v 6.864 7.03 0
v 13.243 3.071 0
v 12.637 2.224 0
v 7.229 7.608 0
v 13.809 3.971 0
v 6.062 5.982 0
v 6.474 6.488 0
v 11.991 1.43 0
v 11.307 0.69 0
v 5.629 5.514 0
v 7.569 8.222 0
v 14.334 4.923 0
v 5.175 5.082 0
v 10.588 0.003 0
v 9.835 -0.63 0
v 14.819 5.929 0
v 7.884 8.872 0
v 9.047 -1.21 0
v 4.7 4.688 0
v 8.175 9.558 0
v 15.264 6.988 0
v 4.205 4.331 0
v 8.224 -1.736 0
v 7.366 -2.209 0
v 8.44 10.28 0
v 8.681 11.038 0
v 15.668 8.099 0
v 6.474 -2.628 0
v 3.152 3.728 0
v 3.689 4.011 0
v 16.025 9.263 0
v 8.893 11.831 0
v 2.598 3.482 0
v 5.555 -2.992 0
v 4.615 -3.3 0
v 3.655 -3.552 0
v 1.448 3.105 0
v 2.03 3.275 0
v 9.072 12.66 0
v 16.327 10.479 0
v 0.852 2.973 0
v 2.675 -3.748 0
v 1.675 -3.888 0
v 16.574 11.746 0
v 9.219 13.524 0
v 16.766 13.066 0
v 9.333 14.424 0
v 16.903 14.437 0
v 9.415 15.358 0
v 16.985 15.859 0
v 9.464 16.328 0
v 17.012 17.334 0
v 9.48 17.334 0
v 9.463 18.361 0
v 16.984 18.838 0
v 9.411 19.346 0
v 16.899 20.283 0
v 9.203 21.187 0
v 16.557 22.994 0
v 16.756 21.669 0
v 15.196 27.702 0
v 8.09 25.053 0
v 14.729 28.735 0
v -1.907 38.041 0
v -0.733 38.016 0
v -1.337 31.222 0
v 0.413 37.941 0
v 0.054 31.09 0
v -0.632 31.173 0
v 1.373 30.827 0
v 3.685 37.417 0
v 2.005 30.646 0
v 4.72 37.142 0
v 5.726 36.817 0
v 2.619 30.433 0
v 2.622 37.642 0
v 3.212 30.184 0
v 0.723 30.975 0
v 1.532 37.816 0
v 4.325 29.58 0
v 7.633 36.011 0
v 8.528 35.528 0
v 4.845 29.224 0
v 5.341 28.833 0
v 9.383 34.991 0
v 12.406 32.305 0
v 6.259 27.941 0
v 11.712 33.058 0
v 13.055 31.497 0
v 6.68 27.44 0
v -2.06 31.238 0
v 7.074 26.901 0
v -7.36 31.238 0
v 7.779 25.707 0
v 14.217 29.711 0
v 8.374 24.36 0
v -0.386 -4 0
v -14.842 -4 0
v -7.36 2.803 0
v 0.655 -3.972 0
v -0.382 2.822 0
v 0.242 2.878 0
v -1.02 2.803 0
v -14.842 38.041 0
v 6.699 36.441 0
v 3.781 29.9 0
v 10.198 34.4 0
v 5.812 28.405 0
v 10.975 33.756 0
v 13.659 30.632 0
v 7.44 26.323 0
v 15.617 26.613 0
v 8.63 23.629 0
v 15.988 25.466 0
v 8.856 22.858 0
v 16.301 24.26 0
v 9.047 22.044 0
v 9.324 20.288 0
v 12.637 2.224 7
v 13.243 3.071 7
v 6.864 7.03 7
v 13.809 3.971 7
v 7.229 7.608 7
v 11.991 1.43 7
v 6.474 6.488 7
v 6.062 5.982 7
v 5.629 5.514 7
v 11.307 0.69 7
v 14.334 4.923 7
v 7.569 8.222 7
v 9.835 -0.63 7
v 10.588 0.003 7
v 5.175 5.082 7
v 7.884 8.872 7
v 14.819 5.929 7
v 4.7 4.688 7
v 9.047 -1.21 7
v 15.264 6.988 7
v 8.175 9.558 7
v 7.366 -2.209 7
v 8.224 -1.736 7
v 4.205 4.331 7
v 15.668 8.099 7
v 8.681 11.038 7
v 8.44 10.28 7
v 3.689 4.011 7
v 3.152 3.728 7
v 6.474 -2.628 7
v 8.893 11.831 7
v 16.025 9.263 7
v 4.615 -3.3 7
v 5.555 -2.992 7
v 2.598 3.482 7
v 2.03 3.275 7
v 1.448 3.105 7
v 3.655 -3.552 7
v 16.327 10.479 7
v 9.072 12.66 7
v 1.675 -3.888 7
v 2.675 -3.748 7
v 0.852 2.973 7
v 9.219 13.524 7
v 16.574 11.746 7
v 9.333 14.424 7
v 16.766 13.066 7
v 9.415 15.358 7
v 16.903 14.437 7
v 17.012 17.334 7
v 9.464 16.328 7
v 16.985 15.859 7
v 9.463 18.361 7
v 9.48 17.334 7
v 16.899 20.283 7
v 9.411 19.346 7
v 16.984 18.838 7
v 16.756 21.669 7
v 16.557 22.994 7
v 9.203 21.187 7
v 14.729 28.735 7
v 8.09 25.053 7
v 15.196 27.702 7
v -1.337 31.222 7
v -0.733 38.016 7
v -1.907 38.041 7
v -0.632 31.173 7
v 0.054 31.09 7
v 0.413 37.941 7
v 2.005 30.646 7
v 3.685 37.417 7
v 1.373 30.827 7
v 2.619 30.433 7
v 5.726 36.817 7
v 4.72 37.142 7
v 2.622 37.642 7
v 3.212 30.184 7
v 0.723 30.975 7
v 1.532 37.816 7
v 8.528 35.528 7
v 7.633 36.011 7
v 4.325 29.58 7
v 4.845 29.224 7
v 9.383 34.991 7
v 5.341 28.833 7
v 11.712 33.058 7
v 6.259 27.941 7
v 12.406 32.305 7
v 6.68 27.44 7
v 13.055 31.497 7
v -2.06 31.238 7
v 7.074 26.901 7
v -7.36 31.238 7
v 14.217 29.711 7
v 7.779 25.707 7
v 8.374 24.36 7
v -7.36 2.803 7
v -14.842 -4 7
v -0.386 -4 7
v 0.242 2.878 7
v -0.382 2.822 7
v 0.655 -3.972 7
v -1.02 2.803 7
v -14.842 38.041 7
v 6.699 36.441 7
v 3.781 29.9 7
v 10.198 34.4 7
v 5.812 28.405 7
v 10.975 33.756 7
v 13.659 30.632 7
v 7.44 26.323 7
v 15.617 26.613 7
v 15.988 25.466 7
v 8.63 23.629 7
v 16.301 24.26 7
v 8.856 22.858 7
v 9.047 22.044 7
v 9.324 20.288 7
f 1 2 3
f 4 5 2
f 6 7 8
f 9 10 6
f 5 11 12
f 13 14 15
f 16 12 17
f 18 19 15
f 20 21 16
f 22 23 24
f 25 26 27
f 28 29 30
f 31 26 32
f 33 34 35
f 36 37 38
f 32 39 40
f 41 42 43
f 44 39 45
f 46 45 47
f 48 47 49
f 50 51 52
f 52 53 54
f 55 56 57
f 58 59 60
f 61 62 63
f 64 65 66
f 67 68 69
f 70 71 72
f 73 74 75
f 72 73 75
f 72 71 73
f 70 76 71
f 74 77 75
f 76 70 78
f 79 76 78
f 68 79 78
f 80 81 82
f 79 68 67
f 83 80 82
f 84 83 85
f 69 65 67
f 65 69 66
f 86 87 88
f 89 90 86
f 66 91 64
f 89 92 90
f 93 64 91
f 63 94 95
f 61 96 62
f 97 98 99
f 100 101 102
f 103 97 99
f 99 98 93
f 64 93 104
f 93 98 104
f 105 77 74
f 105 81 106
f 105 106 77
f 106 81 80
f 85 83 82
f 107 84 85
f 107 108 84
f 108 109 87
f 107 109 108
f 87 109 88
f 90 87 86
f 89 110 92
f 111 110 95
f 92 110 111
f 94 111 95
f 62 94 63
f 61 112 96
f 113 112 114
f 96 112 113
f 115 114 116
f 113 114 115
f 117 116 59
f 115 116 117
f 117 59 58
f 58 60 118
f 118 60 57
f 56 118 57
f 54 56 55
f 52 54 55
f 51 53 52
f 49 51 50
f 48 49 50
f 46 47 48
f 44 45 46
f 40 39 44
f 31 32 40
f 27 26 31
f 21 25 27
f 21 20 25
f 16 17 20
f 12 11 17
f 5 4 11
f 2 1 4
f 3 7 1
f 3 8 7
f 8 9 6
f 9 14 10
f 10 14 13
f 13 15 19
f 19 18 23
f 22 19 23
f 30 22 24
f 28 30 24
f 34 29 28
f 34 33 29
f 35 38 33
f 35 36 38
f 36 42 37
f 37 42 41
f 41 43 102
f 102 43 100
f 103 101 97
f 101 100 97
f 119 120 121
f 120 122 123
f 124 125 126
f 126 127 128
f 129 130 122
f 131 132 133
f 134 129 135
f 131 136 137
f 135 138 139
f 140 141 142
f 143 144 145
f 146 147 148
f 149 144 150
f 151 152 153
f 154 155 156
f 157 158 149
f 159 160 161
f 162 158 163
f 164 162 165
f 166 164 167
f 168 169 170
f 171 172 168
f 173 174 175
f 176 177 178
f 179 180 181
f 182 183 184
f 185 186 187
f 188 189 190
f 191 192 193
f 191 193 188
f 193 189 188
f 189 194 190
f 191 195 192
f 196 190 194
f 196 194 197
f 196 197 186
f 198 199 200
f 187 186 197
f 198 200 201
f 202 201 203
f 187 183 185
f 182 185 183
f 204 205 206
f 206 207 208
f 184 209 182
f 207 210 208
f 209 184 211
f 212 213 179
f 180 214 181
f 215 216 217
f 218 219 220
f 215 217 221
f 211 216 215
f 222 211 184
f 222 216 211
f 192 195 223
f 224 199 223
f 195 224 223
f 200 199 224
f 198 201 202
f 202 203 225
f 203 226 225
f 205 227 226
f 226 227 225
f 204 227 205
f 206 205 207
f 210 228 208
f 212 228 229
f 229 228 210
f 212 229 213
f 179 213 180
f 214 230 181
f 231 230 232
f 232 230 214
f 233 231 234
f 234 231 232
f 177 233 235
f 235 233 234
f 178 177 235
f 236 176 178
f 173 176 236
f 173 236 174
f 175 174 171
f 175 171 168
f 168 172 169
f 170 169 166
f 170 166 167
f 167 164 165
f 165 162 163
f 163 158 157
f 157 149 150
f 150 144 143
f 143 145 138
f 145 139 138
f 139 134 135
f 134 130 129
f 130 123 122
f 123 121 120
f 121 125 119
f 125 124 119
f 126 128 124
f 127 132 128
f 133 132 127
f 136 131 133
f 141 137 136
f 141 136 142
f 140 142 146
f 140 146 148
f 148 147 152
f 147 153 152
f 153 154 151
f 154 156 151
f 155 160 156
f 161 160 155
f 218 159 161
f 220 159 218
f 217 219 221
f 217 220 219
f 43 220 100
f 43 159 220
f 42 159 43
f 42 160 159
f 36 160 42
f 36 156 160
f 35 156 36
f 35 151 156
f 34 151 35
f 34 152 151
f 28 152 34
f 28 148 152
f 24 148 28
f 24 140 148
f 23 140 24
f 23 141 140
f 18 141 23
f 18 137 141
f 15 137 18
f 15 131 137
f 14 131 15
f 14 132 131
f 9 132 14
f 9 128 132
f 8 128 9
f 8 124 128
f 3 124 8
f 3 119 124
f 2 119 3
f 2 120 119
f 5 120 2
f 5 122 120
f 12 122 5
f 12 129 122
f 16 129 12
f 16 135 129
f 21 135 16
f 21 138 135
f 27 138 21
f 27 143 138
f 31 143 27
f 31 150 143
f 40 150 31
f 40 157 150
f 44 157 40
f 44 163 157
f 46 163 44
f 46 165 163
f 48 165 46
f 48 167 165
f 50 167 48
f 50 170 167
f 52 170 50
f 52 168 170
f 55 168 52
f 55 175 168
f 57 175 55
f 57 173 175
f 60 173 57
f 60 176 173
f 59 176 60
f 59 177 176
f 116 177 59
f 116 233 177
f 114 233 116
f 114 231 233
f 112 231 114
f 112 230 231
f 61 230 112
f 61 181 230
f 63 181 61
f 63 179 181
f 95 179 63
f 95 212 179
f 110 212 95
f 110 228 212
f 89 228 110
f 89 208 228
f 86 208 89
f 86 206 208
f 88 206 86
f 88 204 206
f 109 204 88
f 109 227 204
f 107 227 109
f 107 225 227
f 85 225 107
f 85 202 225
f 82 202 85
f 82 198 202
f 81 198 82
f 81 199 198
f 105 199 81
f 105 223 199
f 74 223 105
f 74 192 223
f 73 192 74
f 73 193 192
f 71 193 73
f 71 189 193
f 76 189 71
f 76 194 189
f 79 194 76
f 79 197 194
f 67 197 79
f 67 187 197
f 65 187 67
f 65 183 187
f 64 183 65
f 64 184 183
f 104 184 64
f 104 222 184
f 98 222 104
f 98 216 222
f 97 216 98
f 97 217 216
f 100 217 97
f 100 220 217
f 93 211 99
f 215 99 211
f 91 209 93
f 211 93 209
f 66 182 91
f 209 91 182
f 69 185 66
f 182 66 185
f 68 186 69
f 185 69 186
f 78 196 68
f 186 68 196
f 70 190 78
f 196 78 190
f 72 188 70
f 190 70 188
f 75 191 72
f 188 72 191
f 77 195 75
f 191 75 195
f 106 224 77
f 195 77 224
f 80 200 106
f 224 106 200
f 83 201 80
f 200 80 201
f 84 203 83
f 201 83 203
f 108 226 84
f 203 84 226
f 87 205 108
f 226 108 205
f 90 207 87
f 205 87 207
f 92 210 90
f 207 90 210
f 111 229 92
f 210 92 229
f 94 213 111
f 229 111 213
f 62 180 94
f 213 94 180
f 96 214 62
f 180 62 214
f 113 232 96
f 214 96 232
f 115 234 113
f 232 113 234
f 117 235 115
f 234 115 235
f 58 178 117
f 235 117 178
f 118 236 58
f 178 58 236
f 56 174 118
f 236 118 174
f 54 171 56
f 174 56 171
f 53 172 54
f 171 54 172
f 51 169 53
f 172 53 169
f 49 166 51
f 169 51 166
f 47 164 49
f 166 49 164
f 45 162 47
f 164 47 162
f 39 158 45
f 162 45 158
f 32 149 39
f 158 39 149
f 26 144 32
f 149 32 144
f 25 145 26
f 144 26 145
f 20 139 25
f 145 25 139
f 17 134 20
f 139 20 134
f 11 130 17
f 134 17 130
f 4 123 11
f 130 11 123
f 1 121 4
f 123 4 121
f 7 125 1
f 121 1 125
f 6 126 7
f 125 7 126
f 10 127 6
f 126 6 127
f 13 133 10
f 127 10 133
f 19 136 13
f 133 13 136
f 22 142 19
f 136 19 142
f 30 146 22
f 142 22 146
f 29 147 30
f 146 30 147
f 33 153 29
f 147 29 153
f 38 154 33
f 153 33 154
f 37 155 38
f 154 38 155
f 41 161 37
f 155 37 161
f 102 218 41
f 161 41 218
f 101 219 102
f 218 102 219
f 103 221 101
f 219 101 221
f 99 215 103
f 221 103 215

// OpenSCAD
// file: glyph.scad
// glyph — the shared geometry of every letter in the set. Defines named geometry
// only, so it renders nothing on its own; each letter part includes it and calls
// letter(). Every dimension lives in ../../lib/common.scad.
//
// A LETTER IS NOTHING BUT A LETTER. No plinth, no tongue, no tab — it is the
// bare glyph, and it attaches by standing in the deck groove and resting on the
// groove's floor. Anything else on it would be a distraction on a learning toy.
//
// It is a flat plate of one thickness, printed face-down: no overhang anywhere,
// no supports, and the face on the bed comes out smoothest.
//
// TWO TRAPS WITH text():
//
//  * A missing font FALLS BACK SILENTLY — no warning, no error, just different
//    letters. "Liberation Sans" was the first choice here because OpenSCAD
//    bundles it; on macOS the bundled faces are not registered with fontconfig,
//    so it rendered the fallback face instead and nothing said so. To check a
//    font resolved, render a string with it and with a deliberately bogus name
//    and compare bounding boxes: identical means it fell back.
//  * `size` is not the cap height in general. For Helvetica Bold they coincide
//    (size 44 -> 44.0 mm cap), which is why letter_size reads as a height.
//    Change the font and re-measure.

include <../../lib/common.scad>

// The letter's outline, upright in the XY plane, ready to be extruded along Z
// (which is the letter's thickness, and the print's build axis).
//
//   y = 0   is the deck surface
//   y < 0   is the part standing down inside the groove. It reaches letter_bury,
//           which is where the tapered groove closes to letter_t — NOT the
//           groove's floor. The letter wedges; it never bottoms out.
module glyph_2d(ch) {
    intersection() {
        translate([0, -letter_bury])
            scale([letter_condense, 1])
                text(ch, size = letter_size, font = letter_font,
                     halign = "center", valign = "baseline");
        // Trimmed flat at the baseline. Round letters (O, C, G, S) overshoot the
        // baseline by design, and a letter standing on a convex curve rocks —
        // there is nothing to stop it leaning. The trim costs nothing visible
        // and gives every letter a flat foot on the groove floor.
        translate([-200, -letter_bury]) square([400, 400]);
    }
}

// One letter, in its print orientation: lying on its face, thickness up Z.
module letter(ch) {
    linear_extrude(letter_t) glyph_2d(ch);
}

// Where that letter sits once it is dropped into a chassis, for fit checks.
module letter_fitted(ch) {
    translate([0, letter_t/2, body_top]) rotate([90, 0, 0]) letter(ch);
}
// main file
// letter D — one part. See glyph.scad for the geometry and lib/common.scad for
// the dimensions. Prints lying on its face, exactly as exported: no supports.

include <glyph.scad>

letter("D");
